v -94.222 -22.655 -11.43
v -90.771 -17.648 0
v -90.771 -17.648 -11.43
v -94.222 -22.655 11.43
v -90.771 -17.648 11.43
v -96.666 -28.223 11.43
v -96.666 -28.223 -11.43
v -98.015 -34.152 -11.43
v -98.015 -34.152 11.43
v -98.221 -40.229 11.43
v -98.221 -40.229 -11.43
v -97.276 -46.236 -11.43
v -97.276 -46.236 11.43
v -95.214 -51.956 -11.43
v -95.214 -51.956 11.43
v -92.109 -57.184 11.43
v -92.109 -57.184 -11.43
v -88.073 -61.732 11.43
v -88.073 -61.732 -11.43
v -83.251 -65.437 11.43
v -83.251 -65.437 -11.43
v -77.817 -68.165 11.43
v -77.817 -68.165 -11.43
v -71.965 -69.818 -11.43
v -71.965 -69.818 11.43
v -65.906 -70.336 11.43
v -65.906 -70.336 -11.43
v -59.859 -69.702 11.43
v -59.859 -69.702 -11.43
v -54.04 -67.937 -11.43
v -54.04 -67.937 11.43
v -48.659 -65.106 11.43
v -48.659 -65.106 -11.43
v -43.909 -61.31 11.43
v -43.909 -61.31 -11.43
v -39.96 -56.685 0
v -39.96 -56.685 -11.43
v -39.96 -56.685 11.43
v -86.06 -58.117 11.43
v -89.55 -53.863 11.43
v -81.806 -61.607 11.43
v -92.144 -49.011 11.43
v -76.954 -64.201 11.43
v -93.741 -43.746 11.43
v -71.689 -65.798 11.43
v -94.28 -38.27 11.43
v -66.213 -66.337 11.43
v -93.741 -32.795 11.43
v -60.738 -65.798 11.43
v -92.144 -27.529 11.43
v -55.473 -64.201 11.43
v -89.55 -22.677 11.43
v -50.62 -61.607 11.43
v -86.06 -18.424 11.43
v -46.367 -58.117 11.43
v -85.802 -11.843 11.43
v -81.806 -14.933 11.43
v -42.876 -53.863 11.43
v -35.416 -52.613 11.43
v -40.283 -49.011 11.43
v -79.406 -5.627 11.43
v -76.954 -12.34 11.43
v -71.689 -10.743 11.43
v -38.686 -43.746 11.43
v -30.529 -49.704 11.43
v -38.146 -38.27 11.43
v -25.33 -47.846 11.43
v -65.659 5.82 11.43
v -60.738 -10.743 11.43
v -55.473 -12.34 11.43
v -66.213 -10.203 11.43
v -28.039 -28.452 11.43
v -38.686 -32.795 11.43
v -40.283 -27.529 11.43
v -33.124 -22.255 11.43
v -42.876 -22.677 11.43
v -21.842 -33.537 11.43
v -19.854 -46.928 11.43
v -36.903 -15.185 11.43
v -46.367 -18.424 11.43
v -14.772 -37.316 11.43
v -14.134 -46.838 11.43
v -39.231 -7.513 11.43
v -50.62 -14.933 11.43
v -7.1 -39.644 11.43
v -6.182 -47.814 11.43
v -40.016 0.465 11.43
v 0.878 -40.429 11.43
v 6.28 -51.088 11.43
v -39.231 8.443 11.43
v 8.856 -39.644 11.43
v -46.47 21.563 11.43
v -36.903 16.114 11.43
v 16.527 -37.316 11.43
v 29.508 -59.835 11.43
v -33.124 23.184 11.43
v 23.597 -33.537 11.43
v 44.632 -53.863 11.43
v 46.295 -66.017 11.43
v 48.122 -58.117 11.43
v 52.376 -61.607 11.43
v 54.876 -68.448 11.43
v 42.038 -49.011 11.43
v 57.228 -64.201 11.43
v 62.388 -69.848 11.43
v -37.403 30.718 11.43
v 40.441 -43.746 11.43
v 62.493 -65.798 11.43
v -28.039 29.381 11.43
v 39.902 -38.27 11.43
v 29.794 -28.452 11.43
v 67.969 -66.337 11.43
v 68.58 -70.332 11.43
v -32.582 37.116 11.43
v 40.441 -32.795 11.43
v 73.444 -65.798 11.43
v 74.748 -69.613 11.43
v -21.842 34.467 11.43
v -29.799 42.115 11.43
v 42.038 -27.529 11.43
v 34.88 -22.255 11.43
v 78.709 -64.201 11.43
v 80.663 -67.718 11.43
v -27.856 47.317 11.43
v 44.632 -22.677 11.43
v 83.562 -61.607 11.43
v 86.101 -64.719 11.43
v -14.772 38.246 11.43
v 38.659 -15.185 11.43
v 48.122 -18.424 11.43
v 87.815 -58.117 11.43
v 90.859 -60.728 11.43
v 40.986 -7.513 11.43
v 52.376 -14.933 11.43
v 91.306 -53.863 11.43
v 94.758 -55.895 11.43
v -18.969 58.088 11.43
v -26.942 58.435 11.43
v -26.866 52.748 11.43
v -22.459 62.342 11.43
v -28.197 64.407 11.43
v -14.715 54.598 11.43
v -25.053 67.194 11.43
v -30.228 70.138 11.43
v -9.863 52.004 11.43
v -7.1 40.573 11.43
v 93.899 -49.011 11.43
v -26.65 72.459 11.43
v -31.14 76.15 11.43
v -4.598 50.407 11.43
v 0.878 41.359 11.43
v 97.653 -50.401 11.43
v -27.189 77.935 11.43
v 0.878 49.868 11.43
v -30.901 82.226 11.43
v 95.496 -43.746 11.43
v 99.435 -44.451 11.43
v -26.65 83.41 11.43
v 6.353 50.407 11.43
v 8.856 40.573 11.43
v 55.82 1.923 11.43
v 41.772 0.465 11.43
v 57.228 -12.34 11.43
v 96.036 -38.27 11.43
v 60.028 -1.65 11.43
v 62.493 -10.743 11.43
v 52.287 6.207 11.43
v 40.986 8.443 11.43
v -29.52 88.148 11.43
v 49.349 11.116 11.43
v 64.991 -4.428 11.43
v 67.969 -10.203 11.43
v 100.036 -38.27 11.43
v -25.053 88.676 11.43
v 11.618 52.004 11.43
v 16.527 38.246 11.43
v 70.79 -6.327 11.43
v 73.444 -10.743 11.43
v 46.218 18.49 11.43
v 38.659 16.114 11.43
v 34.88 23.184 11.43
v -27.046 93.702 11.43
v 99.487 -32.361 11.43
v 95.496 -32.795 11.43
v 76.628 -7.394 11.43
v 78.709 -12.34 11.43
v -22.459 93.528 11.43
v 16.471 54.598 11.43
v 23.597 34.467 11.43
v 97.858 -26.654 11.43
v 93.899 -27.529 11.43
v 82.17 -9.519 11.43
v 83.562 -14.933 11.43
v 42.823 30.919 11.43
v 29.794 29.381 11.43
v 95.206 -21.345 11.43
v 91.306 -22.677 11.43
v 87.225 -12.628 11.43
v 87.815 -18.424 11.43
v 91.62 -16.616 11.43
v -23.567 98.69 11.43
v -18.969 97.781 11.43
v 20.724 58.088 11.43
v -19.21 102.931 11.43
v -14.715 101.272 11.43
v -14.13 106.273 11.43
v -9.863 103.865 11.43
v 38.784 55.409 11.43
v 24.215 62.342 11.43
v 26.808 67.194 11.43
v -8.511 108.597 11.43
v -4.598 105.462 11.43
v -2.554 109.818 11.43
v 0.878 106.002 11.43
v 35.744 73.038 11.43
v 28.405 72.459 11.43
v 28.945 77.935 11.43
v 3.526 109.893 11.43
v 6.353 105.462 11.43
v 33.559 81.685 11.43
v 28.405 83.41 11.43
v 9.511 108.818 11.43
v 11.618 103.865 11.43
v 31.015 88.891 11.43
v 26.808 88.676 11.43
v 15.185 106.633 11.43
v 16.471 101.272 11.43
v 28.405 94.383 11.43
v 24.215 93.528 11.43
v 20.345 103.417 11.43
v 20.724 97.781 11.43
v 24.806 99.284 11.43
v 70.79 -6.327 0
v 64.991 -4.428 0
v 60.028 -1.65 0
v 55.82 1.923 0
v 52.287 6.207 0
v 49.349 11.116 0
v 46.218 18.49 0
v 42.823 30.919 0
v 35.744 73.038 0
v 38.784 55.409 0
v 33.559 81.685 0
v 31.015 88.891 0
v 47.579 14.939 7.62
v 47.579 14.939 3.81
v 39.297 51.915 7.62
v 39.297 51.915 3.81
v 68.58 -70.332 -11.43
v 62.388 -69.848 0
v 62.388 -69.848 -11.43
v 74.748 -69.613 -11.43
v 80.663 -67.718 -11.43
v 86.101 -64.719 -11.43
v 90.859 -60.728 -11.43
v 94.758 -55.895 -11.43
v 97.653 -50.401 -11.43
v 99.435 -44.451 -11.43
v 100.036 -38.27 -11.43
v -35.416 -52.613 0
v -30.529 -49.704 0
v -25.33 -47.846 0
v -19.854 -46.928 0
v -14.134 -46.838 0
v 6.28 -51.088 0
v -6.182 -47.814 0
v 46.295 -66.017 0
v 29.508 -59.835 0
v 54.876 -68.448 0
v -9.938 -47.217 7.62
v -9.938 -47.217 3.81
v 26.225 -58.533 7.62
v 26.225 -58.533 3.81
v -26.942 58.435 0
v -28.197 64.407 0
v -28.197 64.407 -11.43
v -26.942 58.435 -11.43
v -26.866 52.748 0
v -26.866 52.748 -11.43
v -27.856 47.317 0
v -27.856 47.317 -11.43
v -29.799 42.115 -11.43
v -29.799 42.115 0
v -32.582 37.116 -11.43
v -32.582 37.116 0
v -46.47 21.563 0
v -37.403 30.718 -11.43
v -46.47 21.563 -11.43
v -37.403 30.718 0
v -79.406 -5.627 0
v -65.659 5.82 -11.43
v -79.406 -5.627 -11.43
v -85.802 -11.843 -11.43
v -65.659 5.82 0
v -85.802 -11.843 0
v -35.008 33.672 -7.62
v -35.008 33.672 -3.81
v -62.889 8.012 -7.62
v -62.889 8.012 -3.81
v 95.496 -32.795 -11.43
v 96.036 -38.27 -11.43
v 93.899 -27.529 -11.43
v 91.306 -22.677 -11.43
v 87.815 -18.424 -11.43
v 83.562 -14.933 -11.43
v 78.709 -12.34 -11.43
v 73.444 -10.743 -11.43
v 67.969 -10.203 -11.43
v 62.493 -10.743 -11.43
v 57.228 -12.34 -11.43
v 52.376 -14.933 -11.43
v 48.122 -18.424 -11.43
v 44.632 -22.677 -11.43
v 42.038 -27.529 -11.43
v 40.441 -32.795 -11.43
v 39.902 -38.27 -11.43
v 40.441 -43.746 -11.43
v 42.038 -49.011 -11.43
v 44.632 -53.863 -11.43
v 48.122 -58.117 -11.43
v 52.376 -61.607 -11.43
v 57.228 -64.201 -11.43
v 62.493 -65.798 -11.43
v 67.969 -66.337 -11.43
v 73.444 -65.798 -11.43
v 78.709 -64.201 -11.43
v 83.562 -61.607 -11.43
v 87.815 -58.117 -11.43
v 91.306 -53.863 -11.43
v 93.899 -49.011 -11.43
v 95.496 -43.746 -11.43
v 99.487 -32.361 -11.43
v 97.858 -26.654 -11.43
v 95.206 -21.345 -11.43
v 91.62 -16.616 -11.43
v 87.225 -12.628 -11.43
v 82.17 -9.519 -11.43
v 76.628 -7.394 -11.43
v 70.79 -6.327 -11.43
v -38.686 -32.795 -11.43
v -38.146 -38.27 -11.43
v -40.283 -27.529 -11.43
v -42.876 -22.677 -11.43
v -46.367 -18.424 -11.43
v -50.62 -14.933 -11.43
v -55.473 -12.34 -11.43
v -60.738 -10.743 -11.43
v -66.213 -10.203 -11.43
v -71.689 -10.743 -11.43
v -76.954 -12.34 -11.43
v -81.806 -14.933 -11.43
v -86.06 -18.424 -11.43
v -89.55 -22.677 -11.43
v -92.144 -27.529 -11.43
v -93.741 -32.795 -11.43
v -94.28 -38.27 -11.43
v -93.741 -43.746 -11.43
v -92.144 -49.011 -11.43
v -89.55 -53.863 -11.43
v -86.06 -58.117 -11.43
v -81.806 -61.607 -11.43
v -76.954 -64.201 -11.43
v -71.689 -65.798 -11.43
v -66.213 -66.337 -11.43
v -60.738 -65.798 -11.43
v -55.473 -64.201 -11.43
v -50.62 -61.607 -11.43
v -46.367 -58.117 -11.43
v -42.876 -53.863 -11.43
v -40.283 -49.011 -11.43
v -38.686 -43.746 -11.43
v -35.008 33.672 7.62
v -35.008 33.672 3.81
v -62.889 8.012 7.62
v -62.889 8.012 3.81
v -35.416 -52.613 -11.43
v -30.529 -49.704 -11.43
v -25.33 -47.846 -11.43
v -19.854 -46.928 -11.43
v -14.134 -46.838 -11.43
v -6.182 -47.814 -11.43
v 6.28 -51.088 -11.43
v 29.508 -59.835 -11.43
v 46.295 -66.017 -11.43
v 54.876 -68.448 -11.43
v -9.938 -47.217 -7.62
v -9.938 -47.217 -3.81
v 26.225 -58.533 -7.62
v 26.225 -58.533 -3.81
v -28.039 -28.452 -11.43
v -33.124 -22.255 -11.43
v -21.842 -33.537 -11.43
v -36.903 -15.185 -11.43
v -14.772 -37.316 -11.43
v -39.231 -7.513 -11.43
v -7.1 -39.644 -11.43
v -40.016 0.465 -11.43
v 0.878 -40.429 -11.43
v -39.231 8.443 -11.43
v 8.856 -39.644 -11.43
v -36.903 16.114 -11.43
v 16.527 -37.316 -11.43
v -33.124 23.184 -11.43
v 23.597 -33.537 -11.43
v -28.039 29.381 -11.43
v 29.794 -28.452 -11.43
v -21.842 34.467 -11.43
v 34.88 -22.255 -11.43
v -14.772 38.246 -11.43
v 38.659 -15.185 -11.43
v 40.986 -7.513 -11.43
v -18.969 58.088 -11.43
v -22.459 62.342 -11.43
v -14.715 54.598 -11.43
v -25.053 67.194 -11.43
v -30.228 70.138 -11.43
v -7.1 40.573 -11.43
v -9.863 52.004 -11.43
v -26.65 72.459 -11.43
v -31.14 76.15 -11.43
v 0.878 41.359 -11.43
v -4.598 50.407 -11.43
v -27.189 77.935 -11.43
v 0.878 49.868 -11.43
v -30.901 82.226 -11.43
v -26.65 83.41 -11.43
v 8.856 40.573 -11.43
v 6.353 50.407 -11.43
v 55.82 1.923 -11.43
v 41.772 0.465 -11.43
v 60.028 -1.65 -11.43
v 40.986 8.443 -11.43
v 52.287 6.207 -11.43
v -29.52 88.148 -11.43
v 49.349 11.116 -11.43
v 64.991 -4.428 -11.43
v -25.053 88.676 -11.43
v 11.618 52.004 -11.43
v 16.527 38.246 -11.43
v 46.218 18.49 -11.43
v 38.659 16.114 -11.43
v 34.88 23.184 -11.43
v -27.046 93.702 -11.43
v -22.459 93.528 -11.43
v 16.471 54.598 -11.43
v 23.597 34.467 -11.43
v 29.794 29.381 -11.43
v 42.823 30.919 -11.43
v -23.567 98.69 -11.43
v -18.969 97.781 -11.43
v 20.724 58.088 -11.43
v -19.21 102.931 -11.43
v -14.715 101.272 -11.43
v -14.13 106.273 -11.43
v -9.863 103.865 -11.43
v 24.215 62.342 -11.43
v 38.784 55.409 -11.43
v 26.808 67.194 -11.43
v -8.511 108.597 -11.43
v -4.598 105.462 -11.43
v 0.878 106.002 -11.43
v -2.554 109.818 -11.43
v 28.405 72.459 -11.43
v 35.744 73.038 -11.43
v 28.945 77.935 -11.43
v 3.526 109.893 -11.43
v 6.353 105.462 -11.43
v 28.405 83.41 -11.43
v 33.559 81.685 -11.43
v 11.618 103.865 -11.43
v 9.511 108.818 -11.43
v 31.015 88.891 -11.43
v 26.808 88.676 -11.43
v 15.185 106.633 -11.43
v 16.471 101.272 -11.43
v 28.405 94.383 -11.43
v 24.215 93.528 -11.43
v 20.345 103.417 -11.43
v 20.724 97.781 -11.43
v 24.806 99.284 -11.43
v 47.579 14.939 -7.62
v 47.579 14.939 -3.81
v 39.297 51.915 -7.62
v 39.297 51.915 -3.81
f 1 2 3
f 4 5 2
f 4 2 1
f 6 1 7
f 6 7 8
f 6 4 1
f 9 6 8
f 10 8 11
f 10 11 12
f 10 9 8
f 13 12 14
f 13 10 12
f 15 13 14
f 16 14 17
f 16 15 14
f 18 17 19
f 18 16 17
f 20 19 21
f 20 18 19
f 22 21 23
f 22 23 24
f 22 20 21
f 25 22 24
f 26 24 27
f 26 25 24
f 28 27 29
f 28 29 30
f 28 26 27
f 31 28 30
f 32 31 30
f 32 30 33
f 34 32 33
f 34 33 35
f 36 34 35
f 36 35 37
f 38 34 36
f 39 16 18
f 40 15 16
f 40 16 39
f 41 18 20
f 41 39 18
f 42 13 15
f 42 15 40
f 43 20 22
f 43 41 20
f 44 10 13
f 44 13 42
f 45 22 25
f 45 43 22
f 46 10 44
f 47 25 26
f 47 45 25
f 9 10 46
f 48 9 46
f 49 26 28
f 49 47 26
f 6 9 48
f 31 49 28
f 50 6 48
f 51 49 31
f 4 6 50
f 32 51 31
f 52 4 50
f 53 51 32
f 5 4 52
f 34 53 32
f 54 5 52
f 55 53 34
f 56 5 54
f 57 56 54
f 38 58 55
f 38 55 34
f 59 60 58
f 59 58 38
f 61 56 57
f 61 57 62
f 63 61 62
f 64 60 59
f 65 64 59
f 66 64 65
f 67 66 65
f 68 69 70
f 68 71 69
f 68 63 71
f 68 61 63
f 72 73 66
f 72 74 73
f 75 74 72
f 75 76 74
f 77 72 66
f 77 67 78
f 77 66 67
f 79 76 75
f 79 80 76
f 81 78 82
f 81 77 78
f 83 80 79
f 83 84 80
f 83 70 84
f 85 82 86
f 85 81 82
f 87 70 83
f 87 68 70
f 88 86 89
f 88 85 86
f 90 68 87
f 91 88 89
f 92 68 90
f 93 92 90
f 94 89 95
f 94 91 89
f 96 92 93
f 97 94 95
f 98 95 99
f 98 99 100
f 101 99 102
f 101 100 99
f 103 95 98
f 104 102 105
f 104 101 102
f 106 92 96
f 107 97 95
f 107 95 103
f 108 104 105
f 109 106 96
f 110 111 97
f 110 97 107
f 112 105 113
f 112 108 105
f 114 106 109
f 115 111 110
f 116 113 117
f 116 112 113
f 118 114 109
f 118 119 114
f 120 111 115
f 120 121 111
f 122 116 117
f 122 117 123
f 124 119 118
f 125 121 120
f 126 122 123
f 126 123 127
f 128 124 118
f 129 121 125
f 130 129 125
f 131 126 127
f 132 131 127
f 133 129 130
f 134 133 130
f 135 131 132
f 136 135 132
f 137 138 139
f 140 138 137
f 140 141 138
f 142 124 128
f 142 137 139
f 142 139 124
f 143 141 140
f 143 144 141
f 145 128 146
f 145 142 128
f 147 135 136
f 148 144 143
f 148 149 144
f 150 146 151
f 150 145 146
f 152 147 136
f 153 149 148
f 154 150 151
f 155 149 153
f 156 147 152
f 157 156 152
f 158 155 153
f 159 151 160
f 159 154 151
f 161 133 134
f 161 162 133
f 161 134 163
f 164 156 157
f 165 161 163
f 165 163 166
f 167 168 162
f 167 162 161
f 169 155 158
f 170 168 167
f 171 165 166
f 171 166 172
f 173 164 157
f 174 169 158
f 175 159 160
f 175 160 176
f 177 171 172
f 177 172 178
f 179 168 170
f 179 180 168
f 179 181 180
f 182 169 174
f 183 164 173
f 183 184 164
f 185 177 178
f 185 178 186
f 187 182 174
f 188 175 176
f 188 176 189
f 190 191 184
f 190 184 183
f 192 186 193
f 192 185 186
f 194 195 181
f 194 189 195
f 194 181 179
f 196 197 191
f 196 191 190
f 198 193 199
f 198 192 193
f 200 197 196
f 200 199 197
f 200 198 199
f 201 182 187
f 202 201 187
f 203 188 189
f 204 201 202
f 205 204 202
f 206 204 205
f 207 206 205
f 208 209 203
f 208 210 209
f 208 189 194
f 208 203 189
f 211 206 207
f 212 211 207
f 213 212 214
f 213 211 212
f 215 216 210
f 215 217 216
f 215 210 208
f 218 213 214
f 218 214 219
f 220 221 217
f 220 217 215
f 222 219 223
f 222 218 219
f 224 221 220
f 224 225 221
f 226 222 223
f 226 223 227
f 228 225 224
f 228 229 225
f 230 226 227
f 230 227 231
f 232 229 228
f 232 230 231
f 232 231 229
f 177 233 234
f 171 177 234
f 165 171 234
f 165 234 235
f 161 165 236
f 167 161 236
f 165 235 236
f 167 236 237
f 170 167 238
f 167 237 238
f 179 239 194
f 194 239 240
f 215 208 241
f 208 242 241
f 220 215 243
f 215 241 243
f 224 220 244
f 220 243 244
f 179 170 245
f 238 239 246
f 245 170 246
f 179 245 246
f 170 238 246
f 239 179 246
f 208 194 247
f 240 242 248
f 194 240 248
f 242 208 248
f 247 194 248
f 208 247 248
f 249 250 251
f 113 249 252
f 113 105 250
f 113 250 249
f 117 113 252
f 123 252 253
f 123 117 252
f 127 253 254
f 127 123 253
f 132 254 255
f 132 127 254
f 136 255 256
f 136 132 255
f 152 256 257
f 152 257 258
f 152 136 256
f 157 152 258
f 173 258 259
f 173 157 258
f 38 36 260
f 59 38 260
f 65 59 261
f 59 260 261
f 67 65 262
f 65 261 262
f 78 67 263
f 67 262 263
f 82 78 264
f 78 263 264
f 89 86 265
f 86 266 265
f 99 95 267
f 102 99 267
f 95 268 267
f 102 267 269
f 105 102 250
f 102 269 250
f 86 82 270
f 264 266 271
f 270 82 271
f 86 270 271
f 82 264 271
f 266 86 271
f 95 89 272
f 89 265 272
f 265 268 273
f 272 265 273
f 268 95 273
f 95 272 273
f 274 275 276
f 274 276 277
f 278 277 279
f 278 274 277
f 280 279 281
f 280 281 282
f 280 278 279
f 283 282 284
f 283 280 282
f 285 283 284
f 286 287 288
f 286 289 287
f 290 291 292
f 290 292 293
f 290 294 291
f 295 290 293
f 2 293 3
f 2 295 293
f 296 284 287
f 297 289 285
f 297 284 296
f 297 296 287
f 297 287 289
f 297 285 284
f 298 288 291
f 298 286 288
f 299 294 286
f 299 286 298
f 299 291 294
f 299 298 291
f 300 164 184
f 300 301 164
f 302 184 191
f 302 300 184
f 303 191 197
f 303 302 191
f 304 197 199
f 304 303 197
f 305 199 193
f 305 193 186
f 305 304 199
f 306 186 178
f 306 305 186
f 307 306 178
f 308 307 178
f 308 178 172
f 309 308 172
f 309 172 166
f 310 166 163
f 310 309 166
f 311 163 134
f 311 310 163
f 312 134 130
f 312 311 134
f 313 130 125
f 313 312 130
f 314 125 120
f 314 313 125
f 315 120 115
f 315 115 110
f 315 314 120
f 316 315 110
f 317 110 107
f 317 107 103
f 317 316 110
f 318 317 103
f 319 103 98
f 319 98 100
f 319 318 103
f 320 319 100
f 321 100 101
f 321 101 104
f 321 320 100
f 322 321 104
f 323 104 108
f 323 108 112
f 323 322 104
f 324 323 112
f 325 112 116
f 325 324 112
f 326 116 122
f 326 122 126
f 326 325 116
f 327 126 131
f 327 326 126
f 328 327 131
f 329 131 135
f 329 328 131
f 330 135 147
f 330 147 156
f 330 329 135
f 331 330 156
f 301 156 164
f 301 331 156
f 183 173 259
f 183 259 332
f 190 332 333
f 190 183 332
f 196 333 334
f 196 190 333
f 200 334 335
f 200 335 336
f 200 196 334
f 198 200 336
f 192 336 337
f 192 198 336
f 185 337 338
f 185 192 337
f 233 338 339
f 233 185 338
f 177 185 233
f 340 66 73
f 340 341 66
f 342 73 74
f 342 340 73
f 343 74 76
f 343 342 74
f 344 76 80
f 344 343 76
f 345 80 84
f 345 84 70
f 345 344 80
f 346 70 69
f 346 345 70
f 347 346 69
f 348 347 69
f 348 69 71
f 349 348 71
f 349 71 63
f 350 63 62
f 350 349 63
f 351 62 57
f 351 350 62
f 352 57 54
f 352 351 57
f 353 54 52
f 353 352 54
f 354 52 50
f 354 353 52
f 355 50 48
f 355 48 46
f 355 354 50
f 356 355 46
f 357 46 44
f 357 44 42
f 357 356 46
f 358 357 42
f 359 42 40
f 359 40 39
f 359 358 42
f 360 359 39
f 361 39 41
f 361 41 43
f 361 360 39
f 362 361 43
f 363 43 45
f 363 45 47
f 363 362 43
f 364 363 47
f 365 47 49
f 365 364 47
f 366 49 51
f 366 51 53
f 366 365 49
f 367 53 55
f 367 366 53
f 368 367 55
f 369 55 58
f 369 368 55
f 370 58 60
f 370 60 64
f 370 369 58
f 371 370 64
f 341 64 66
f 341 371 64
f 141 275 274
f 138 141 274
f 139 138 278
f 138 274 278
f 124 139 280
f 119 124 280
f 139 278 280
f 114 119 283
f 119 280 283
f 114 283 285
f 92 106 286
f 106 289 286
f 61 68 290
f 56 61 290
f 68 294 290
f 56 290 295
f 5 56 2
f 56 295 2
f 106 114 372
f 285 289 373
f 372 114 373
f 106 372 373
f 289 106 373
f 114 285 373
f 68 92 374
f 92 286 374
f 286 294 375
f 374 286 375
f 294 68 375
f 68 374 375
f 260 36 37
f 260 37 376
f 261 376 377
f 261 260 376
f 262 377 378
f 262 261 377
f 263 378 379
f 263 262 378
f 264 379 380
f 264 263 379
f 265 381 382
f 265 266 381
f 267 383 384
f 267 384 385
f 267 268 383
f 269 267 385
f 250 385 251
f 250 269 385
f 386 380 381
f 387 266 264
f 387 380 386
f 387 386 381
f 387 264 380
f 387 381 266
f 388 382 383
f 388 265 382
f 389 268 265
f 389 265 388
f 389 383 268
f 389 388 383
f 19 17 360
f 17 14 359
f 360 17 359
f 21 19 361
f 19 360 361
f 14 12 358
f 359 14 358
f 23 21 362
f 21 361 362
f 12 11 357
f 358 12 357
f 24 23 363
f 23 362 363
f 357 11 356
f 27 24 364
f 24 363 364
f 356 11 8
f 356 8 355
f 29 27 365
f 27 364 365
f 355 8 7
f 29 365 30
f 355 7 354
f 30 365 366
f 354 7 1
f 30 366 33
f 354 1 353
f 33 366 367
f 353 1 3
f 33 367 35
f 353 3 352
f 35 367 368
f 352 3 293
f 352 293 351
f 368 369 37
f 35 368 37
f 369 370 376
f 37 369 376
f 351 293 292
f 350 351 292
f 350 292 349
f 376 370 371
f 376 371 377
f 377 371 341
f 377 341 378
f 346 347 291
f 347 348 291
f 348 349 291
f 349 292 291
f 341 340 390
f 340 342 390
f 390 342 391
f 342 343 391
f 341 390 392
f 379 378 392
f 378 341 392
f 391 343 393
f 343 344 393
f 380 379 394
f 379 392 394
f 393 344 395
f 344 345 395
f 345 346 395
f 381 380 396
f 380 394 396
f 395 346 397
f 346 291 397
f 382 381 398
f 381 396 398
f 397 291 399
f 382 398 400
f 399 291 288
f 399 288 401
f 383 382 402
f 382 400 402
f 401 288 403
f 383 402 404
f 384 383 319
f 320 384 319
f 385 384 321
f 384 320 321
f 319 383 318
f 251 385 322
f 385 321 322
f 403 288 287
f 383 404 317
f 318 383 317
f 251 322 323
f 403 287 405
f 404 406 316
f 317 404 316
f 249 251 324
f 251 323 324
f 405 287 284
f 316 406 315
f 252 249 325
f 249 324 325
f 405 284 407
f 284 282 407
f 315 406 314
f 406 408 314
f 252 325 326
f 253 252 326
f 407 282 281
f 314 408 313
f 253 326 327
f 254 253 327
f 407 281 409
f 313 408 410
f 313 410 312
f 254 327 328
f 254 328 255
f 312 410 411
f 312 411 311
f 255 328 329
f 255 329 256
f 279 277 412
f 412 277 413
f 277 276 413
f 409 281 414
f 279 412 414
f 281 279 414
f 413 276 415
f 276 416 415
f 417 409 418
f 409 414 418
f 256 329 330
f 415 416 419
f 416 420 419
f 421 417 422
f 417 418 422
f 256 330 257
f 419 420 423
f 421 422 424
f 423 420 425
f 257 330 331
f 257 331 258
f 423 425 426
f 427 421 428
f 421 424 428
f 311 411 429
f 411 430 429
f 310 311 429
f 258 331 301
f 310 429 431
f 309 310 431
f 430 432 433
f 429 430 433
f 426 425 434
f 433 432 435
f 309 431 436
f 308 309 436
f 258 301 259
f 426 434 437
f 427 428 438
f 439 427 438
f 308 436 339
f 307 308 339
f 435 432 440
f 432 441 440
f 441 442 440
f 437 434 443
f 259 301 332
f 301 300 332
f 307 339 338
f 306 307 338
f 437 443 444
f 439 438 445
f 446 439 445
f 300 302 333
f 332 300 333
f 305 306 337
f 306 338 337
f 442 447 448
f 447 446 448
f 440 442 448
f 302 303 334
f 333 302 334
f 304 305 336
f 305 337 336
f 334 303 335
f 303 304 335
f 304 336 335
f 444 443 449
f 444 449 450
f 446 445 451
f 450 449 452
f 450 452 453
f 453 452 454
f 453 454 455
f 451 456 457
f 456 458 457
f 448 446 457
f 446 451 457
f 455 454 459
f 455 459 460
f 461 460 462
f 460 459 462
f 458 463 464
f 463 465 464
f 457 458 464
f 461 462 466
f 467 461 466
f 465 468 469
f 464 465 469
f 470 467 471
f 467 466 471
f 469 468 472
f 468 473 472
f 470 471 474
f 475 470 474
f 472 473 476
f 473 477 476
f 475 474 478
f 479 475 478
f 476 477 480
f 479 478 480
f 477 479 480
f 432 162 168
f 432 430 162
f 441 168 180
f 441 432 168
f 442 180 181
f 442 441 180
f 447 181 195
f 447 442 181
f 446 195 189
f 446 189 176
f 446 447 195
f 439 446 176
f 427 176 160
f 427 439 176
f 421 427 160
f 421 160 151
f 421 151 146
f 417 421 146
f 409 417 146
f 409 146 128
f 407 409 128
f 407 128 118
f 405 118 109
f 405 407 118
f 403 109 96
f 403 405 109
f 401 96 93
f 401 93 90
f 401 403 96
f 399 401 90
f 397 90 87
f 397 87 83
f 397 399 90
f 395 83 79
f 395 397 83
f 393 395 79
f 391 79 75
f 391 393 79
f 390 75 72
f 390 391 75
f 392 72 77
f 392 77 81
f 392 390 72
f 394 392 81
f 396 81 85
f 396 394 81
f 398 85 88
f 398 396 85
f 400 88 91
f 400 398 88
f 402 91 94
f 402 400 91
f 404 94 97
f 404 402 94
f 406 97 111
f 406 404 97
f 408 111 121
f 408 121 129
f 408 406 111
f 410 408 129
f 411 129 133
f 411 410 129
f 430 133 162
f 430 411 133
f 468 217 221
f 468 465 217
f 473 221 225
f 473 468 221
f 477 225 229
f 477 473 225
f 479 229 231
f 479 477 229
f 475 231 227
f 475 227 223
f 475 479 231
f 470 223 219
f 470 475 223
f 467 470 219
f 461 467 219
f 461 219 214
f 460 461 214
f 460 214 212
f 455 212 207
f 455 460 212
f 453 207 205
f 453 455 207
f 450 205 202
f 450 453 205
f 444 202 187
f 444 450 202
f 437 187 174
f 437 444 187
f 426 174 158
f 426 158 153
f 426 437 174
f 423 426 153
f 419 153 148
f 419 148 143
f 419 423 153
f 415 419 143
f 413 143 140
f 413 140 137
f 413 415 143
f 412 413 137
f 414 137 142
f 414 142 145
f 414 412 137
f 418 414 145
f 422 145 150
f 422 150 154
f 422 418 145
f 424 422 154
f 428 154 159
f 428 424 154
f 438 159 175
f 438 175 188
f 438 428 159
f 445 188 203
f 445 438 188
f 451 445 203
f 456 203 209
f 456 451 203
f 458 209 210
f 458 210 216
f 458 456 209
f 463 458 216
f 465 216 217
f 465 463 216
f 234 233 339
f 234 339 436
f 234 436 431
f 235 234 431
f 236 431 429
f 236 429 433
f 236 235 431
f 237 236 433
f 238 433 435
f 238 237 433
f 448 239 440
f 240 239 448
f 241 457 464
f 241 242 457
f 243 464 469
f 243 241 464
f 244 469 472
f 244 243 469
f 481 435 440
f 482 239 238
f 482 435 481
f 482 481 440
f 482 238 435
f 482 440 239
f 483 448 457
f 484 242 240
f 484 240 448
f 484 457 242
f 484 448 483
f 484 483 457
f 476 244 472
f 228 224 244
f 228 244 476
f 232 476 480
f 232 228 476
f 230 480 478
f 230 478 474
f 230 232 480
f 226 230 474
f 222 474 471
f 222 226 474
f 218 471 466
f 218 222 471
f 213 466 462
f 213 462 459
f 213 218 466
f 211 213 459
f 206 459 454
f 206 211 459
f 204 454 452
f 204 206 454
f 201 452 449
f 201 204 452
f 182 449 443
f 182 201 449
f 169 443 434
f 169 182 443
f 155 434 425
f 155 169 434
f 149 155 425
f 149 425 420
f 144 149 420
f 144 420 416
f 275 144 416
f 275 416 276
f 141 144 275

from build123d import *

# Parameters (mm, degrees)
F0_R     = 28.067
F0_R_2   = 40.894
F1_DEPTH = 11.43


with BuildPart() as f1:
    # F0 (on Top) → F1 (new body, symmetric)
    with BuildSketch(Plane.XY):
        with BuildLine():
            ThreePointArc((-39.96043, -56.685273), (-35.633978, -47.925871), (-34.145784, -38.270273))
            ThreePointArc((-34.145784, -38.270273), (-55.239867, -8.13875), (-90.770633, -17.648411))
            ThreePointArc((-90.770633, -17.648411), (-85.750117, -63.699325), (-39.96043, -56.685273))
        make_face()
        with Locations((-66.213284, -38.270273)):
            Circle(F0_R, mode=Mode.SUBTRACT)
        with BuildLine():
            ThreePointArc((-90.770633, -17.648411), (-55.239867, -8.13875), (-34.145784, -38.270273))
            ThreePointArc((-34.145784, -38.270273), (-35.633978, -47.925871), (-39.96043, -56.685273))
            add(Edge.make_bspline(
                [(-39.96043, -56.685273), (-15.055393, -29.895963), (28.272031, -65.460931), (62.38831, -69.848491)],
                knots=[0, 0, 0, 0, 103.191739, 103.191739, 103.191739, 103.191739], degree=3))
            ThreePointArc((62.38831, -69.848491), (36.17807, -34.065405), (70.790123, -6.327134))
            add(Edge.make_bspline(
                [(70.790123, -6.327134), (35.137381, 1.846606), (44.273835, 57.15174), (31.015434, 88.891084)],
                knots=[0, 0, 0, 0, 103.191739, 103.191739, 103.191739, 103.191739], degree=3))
            ThreePointArc((31.015434, 88.891084), (32.459077, 83.49723), (32.945204, 77.934727))
            ThreePointArc((32.945204, 77.934727), (7.805363, 46.624472), (-28.196581, 64.406589))
            add(Edge.make_bspline(
                [(-28.196581, 64.406589), (-17.448877, 29.443539), (-69.912755, 9.703373), (-90.770633, -17.648411)],
                knots=[0, 0, 0, 0, 103.191739, 103.191739, 103.191739, 103.191739], degree=3))
        make_face()
        with Locations((0.877704, 0.464727)):
            Circle(F0_R_2, mode=Mode.SUBTRACT)
        with BuildLine():
            ThreePointArc((31.015434, 88.891084), (-11.376085, 107.568647), (-28.196581, 64.406589))
            ThreePointArc((-28.196581, 64.406589), (7.805363, 46.624472), (32.945204, 77.934727))
            ThreePointArc((32.945204, 77.934727), (32.459077, 83.49723), (31.015434, 88.891084))
        make_face()
        with Locations((0.877704, 77.934727)):
            Circle(F0_R, mode=Mode.SUBTRACT)
        with BuildLine():
            ThreePointArc((70.790123, -6.327134), (36.17807, -34.065405), (62.38831, -69.848491))
            ThreePointArc((62.38831, -69.848491), (88.576647, -62.839292), (100.036192, -38.270273))
            ThreePointArc((100.036192, -38.270273), (91.620339, -16.615616), (70.790123, -6.327134))
        make_face()
        with Locations((67.968692, -38.270273)):
            Circle(F0_R, mode=Mode.SUBTRACT)
    extrude(amount=F1_DEPTH, both=True)


solid = f1.part
